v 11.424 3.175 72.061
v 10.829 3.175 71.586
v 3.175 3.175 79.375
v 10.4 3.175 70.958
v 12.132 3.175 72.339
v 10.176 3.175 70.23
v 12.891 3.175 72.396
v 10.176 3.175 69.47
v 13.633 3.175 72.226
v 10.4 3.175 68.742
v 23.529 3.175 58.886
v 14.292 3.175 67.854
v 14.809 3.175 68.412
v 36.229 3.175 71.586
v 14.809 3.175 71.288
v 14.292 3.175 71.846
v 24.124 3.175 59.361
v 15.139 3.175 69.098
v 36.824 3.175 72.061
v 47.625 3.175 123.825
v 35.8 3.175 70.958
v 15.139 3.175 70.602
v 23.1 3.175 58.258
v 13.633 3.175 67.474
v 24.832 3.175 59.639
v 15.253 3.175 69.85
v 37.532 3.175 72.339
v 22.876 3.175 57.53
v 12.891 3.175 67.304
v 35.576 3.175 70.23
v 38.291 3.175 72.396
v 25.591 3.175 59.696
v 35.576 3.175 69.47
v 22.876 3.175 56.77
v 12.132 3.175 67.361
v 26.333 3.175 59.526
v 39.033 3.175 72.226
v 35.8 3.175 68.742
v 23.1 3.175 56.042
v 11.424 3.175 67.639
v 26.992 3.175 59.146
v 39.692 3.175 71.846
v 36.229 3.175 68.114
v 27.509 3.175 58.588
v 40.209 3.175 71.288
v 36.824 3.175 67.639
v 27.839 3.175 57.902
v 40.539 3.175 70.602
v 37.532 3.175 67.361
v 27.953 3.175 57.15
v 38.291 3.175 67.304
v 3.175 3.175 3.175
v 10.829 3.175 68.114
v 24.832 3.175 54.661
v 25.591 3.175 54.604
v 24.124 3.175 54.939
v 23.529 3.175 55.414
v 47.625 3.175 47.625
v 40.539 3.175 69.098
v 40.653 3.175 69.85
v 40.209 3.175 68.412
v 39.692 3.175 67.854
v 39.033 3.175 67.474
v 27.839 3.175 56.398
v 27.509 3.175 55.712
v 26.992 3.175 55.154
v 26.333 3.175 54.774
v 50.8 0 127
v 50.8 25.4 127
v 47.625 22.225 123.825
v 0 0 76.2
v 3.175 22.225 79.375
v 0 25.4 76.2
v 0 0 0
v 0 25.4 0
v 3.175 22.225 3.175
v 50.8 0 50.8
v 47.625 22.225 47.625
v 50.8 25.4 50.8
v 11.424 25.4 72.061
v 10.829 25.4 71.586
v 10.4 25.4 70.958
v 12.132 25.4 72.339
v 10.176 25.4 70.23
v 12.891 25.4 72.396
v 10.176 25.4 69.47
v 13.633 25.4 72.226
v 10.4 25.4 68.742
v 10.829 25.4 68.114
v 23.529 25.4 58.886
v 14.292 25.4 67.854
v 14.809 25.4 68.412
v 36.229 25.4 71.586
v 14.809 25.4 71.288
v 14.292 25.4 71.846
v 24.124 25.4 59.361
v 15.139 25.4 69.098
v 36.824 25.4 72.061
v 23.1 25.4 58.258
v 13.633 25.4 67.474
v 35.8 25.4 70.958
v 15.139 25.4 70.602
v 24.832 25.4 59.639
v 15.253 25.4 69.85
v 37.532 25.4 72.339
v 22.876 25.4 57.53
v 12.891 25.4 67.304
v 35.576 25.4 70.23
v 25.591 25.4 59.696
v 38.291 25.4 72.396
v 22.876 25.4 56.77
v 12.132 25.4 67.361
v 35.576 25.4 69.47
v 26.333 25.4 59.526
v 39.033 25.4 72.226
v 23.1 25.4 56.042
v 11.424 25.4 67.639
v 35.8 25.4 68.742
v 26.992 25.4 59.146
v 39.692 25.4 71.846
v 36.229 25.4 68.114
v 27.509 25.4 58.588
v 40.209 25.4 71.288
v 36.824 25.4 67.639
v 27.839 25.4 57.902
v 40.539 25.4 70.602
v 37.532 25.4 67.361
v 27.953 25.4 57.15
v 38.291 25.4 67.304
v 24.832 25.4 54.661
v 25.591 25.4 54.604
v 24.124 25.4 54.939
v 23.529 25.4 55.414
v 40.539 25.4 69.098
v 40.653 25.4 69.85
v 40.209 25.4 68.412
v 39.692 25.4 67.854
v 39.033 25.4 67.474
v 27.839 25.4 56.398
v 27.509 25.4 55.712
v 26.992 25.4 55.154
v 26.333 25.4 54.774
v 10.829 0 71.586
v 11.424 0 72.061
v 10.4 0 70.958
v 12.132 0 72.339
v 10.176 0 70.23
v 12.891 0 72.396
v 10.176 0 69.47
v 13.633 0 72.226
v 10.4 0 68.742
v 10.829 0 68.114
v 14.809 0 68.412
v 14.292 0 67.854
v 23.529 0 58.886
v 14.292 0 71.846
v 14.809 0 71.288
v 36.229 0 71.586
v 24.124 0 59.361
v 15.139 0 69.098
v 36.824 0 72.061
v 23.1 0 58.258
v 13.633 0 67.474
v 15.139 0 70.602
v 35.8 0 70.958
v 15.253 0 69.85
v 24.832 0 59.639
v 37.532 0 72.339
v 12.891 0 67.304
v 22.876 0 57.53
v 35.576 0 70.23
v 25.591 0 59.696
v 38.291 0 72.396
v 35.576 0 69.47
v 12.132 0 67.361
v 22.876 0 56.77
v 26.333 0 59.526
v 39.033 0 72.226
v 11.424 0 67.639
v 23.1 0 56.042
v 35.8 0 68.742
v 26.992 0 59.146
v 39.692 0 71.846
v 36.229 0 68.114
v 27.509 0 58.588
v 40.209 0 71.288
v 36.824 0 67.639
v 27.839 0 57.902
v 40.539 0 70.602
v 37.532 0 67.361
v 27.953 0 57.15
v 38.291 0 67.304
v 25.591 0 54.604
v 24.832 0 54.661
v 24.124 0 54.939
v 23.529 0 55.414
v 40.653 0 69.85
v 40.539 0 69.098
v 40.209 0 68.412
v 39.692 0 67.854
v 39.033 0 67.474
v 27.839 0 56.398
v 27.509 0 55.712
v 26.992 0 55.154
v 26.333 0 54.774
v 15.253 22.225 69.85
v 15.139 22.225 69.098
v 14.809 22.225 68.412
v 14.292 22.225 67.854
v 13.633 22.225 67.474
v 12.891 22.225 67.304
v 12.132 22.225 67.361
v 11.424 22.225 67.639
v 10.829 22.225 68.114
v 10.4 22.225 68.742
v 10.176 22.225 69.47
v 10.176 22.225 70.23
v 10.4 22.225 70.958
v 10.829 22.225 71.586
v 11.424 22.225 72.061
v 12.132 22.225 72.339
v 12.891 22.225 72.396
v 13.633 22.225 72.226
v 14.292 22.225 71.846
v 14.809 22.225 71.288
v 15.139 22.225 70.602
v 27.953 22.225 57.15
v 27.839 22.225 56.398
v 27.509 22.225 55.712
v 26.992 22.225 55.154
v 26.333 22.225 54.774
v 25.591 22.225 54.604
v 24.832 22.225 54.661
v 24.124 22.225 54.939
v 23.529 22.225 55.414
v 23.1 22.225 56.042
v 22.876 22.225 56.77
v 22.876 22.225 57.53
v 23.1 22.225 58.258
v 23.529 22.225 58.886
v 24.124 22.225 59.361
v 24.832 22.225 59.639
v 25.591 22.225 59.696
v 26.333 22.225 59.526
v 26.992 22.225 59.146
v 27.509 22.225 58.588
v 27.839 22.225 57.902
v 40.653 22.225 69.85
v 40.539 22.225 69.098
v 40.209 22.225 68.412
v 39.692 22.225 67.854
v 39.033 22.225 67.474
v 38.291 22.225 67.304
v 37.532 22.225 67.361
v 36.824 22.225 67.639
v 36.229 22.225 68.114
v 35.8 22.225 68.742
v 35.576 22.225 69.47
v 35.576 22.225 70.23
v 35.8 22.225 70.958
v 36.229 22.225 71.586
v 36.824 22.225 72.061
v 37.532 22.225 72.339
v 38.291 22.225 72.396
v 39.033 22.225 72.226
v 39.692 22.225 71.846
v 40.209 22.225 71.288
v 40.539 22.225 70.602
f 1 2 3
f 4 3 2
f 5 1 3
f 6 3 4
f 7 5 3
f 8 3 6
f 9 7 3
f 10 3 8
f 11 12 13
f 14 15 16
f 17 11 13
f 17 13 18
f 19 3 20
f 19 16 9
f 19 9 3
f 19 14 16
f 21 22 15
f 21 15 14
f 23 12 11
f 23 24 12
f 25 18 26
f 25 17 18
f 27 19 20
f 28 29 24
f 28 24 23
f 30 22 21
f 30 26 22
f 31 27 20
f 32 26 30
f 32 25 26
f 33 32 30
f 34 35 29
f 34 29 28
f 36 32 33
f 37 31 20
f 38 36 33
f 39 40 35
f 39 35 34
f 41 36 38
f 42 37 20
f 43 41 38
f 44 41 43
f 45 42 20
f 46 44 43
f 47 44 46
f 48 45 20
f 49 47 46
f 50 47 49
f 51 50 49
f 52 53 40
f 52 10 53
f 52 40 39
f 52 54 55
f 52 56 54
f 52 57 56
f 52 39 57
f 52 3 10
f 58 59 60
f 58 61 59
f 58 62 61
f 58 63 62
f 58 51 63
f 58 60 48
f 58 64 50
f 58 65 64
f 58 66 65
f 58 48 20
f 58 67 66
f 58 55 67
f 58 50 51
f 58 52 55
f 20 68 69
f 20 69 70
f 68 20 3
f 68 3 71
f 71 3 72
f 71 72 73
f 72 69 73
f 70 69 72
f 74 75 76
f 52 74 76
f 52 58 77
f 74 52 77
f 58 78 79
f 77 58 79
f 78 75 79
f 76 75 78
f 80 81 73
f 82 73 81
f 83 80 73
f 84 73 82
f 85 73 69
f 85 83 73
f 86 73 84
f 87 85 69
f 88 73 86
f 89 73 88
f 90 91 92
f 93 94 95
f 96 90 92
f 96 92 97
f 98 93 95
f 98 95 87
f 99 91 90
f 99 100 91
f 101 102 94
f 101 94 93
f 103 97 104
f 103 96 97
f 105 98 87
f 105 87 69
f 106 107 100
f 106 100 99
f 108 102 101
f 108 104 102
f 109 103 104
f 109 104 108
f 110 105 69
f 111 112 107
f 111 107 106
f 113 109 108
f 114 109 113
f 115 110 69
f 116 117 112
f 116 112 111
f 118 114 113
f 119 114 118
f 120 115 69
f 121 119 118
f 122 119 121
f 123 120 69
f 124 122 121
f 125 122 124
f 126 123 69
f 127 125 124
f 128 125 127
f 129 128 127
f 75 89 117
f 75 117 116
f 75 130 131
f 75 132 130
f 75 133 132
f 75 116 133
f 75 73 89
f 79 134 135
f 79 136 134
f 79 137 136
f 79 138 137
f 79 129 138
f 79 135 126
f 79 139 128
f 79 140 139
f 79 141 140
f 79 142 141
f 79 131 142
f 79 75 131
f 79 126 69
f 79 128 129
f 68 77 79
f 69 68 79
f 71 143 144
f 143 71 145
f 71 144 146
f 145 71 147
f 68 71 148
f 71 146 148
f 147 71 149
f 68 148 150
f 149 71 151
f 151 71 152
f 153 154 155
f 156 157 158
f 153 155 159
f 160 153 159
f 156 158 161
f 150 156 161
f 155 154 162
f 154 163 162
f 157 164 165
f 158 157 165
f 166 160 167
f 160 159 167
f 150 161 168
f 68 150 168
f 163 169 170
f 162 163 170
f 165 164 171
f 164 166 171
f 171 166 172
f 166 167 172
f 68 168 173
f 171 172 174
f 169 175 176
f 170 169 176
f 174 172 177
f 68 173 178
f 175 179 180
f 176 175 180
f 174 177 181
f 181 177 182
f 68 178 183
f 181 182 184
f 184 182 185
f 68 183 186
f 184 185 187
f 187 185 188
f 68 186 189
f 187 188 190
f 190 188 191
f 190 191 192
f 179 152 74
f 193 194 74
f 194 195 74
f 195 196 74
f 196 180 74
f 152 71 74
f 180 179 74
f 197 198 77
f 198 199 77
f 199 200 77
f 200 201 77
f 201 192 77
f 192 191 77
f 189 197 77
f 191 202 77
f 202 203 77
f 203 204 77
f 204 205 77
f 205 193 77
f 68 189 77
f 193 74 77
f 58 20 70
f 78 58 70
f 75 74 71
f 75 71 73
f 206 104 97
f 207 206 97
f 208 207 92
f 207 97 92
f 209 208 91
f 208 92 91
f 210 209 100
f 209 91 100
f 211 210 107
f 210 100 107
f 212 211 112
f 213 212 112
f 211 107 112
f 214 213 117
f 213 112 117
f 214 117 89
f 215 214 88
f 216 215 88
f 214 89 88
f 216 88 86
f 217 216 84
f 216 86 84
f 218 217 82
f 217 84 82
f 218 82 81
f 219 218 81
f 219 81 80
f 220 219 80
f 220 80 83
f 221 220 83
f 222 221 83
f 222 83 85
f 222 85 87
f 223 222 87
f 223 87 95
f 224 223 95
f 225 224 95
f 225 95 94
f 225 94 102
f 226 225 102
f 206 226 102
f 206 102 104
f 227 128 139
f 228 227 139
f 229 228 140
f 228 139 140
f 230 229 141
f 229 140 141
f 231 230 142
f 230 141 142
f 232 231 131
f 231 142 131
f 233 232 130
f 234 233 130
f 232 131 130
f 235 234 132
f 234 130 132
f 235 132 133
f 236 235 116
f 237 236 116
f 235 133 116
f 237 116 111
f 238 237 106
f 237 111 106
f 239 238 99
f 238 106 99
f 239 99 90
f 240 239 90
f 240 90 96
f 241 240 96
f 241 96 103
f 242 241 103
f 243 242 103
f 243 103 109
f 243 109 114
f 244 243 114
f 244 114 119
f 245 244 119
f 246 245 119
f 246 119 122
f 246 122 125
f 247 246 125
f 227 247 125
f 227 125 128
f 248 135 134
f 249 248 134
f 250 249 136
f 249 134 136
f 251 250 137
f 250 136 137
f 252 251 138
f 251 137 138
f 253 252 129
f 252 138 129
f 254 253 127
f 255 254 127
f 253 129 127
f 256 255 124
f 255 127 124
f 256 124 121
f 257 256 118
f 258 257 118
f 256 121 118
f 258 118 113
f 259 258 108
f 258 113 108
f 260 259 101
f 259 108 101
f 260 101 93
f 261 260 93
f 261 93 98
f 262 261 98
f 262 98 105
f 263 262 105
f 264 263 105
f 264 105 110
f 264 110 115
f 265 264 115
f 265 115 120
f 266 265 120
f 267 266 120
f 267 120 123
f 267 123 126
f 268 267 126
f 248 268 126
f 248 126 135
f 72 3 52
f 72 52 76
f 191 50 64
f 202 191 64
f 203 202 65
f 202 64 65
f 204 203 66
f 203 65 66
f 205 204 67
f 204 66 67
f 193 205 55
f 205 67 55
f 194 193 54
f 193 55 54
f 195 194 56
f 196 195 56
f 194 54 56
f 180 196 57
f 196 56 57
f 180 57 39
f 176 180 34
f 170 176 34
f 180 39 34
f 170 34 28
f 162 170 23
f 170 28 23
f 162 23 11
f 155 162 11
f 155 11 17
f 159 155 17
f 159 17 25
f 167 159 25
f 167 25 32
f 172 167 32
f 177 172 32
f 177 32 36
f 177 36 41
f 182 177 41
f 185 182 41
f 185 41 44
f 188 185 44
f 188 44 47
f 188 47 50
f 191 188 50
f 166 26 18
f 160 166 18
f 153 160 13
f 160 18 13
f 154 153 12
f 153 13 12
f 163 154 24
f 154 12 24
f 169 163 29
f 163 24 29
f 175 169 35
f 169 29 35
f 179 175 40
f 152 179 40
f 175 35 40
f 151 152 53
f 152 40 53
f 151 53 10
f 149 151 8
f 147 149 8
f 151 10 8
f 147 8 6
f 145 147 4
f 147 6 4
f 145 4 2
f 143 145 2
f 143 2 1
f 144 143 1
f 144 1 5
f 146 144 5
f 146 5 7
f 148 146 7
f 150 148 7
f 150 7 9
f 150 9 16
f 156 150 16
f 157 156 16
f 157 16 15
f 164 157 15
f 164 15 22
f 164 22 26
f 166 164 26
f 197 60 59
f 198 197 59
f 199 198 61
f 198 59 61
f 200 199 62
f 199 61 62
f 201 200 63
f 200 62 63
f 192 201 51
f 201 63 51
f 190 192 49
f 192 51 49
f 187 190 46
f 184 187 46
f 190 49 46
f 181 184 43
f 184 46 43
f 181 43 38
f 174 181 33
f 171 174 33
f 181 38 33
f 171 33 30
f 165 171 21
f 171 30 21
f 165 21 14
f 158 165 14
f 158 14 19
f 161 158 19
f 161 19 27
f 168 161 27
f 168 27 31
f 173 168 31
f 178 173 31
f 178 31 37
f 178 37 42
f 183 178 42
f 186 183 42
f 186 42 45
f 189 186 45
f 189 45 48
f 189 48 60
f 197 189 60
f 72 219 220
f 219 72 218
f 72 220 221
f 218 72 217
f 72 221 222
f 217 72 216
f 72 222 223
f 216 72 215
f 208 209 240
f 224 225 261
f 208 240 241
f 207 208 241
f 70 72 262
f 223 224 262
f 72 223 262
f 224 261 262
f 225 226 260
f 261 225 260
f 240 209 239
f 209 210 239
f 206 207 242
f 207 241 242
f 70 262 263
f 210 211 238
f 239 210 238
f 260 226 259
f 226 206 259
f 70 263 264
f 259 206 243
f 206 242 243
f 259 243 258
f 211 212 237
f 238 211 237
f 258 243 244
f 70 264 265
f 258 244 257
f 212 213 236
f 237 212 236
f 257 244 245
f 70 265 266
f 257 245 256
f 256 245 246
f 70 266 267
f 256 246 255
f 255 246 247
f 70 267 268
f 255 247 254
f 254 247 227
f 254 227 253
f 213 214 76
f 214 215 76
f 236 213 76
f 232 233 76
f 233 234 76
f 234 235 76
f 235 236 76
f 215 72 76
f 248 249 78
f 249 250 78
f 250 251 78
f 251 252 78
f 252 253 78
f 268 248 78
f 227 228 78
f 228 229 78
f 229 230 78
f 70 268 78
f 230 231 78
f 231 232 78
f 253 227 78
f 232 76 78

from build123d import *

# Parameters (mm, degrees)
SKETCH1_W           = 50.8
SKETCH1_H           = 25.4
SKETCH1_W_2         = 44.45
SKETCH1_H_2         = 19.05
BOSS_EXTRUDE1_DEPTH = 127
CUT_EXTRUDE1_DEPTH  = 127
SKETCH3_R           = 2.5527
CUT_EXTRUDE2_DEPTH  = 25.4


with BuildPart() as part:
    # Sketch1 → Boss-Extrude1 (new body)
    with BuildSketch(Plane.XY):
        with Locations((25.4, 12.7)):
            Rectangle(SKETCH1_W, SKETCH1_H)
        with Locations((25.4, 12.7)):
            Rectangle(SKETCH1_W_2, SKETCH1_H_2, mode=Mode.SUBTRACT)
    extrude(amount=BOSS_EXTRUDE1_DEPTH)

    # Sketch2 → Cut-Extrude1 (cut)
    with BuildSketch(Plane(origin=(0, 25.4, 0), x_dir=(1, 0, 0), z_dir=(0, 1, 0))):
        Polygon((0, 0), (50.8, -50.8), (50.8, 0), align=None)
        Polygon((0, -76.2), (0, -127), (50.8, -127), align=None)
    extrude(amount=-CUT_EXTRUDE1_DEPTH, mode=Mode.SUBTRACT)

    # Sketch3 → Cut-Extrude2 (cut)
    with BuildSketch(Plane(origin=(0, 25.4, 0), x_dir=(1, 0, 0), z_dir=(0, 1, 0))):
        with Locations((12.7, -69.85)):
            Circle(SKETCH3_R)
        with Locations((38.1, -69.85)):
            Circle(SKETCH3_R)
        with Locations((25.4, -57.15)):
            Circle(SKETCH3_R)
    extrude(amount=-CUT_EXTRUDE2_DEPTH, mode=Mode.SUBTRACT)


solid = part.part
